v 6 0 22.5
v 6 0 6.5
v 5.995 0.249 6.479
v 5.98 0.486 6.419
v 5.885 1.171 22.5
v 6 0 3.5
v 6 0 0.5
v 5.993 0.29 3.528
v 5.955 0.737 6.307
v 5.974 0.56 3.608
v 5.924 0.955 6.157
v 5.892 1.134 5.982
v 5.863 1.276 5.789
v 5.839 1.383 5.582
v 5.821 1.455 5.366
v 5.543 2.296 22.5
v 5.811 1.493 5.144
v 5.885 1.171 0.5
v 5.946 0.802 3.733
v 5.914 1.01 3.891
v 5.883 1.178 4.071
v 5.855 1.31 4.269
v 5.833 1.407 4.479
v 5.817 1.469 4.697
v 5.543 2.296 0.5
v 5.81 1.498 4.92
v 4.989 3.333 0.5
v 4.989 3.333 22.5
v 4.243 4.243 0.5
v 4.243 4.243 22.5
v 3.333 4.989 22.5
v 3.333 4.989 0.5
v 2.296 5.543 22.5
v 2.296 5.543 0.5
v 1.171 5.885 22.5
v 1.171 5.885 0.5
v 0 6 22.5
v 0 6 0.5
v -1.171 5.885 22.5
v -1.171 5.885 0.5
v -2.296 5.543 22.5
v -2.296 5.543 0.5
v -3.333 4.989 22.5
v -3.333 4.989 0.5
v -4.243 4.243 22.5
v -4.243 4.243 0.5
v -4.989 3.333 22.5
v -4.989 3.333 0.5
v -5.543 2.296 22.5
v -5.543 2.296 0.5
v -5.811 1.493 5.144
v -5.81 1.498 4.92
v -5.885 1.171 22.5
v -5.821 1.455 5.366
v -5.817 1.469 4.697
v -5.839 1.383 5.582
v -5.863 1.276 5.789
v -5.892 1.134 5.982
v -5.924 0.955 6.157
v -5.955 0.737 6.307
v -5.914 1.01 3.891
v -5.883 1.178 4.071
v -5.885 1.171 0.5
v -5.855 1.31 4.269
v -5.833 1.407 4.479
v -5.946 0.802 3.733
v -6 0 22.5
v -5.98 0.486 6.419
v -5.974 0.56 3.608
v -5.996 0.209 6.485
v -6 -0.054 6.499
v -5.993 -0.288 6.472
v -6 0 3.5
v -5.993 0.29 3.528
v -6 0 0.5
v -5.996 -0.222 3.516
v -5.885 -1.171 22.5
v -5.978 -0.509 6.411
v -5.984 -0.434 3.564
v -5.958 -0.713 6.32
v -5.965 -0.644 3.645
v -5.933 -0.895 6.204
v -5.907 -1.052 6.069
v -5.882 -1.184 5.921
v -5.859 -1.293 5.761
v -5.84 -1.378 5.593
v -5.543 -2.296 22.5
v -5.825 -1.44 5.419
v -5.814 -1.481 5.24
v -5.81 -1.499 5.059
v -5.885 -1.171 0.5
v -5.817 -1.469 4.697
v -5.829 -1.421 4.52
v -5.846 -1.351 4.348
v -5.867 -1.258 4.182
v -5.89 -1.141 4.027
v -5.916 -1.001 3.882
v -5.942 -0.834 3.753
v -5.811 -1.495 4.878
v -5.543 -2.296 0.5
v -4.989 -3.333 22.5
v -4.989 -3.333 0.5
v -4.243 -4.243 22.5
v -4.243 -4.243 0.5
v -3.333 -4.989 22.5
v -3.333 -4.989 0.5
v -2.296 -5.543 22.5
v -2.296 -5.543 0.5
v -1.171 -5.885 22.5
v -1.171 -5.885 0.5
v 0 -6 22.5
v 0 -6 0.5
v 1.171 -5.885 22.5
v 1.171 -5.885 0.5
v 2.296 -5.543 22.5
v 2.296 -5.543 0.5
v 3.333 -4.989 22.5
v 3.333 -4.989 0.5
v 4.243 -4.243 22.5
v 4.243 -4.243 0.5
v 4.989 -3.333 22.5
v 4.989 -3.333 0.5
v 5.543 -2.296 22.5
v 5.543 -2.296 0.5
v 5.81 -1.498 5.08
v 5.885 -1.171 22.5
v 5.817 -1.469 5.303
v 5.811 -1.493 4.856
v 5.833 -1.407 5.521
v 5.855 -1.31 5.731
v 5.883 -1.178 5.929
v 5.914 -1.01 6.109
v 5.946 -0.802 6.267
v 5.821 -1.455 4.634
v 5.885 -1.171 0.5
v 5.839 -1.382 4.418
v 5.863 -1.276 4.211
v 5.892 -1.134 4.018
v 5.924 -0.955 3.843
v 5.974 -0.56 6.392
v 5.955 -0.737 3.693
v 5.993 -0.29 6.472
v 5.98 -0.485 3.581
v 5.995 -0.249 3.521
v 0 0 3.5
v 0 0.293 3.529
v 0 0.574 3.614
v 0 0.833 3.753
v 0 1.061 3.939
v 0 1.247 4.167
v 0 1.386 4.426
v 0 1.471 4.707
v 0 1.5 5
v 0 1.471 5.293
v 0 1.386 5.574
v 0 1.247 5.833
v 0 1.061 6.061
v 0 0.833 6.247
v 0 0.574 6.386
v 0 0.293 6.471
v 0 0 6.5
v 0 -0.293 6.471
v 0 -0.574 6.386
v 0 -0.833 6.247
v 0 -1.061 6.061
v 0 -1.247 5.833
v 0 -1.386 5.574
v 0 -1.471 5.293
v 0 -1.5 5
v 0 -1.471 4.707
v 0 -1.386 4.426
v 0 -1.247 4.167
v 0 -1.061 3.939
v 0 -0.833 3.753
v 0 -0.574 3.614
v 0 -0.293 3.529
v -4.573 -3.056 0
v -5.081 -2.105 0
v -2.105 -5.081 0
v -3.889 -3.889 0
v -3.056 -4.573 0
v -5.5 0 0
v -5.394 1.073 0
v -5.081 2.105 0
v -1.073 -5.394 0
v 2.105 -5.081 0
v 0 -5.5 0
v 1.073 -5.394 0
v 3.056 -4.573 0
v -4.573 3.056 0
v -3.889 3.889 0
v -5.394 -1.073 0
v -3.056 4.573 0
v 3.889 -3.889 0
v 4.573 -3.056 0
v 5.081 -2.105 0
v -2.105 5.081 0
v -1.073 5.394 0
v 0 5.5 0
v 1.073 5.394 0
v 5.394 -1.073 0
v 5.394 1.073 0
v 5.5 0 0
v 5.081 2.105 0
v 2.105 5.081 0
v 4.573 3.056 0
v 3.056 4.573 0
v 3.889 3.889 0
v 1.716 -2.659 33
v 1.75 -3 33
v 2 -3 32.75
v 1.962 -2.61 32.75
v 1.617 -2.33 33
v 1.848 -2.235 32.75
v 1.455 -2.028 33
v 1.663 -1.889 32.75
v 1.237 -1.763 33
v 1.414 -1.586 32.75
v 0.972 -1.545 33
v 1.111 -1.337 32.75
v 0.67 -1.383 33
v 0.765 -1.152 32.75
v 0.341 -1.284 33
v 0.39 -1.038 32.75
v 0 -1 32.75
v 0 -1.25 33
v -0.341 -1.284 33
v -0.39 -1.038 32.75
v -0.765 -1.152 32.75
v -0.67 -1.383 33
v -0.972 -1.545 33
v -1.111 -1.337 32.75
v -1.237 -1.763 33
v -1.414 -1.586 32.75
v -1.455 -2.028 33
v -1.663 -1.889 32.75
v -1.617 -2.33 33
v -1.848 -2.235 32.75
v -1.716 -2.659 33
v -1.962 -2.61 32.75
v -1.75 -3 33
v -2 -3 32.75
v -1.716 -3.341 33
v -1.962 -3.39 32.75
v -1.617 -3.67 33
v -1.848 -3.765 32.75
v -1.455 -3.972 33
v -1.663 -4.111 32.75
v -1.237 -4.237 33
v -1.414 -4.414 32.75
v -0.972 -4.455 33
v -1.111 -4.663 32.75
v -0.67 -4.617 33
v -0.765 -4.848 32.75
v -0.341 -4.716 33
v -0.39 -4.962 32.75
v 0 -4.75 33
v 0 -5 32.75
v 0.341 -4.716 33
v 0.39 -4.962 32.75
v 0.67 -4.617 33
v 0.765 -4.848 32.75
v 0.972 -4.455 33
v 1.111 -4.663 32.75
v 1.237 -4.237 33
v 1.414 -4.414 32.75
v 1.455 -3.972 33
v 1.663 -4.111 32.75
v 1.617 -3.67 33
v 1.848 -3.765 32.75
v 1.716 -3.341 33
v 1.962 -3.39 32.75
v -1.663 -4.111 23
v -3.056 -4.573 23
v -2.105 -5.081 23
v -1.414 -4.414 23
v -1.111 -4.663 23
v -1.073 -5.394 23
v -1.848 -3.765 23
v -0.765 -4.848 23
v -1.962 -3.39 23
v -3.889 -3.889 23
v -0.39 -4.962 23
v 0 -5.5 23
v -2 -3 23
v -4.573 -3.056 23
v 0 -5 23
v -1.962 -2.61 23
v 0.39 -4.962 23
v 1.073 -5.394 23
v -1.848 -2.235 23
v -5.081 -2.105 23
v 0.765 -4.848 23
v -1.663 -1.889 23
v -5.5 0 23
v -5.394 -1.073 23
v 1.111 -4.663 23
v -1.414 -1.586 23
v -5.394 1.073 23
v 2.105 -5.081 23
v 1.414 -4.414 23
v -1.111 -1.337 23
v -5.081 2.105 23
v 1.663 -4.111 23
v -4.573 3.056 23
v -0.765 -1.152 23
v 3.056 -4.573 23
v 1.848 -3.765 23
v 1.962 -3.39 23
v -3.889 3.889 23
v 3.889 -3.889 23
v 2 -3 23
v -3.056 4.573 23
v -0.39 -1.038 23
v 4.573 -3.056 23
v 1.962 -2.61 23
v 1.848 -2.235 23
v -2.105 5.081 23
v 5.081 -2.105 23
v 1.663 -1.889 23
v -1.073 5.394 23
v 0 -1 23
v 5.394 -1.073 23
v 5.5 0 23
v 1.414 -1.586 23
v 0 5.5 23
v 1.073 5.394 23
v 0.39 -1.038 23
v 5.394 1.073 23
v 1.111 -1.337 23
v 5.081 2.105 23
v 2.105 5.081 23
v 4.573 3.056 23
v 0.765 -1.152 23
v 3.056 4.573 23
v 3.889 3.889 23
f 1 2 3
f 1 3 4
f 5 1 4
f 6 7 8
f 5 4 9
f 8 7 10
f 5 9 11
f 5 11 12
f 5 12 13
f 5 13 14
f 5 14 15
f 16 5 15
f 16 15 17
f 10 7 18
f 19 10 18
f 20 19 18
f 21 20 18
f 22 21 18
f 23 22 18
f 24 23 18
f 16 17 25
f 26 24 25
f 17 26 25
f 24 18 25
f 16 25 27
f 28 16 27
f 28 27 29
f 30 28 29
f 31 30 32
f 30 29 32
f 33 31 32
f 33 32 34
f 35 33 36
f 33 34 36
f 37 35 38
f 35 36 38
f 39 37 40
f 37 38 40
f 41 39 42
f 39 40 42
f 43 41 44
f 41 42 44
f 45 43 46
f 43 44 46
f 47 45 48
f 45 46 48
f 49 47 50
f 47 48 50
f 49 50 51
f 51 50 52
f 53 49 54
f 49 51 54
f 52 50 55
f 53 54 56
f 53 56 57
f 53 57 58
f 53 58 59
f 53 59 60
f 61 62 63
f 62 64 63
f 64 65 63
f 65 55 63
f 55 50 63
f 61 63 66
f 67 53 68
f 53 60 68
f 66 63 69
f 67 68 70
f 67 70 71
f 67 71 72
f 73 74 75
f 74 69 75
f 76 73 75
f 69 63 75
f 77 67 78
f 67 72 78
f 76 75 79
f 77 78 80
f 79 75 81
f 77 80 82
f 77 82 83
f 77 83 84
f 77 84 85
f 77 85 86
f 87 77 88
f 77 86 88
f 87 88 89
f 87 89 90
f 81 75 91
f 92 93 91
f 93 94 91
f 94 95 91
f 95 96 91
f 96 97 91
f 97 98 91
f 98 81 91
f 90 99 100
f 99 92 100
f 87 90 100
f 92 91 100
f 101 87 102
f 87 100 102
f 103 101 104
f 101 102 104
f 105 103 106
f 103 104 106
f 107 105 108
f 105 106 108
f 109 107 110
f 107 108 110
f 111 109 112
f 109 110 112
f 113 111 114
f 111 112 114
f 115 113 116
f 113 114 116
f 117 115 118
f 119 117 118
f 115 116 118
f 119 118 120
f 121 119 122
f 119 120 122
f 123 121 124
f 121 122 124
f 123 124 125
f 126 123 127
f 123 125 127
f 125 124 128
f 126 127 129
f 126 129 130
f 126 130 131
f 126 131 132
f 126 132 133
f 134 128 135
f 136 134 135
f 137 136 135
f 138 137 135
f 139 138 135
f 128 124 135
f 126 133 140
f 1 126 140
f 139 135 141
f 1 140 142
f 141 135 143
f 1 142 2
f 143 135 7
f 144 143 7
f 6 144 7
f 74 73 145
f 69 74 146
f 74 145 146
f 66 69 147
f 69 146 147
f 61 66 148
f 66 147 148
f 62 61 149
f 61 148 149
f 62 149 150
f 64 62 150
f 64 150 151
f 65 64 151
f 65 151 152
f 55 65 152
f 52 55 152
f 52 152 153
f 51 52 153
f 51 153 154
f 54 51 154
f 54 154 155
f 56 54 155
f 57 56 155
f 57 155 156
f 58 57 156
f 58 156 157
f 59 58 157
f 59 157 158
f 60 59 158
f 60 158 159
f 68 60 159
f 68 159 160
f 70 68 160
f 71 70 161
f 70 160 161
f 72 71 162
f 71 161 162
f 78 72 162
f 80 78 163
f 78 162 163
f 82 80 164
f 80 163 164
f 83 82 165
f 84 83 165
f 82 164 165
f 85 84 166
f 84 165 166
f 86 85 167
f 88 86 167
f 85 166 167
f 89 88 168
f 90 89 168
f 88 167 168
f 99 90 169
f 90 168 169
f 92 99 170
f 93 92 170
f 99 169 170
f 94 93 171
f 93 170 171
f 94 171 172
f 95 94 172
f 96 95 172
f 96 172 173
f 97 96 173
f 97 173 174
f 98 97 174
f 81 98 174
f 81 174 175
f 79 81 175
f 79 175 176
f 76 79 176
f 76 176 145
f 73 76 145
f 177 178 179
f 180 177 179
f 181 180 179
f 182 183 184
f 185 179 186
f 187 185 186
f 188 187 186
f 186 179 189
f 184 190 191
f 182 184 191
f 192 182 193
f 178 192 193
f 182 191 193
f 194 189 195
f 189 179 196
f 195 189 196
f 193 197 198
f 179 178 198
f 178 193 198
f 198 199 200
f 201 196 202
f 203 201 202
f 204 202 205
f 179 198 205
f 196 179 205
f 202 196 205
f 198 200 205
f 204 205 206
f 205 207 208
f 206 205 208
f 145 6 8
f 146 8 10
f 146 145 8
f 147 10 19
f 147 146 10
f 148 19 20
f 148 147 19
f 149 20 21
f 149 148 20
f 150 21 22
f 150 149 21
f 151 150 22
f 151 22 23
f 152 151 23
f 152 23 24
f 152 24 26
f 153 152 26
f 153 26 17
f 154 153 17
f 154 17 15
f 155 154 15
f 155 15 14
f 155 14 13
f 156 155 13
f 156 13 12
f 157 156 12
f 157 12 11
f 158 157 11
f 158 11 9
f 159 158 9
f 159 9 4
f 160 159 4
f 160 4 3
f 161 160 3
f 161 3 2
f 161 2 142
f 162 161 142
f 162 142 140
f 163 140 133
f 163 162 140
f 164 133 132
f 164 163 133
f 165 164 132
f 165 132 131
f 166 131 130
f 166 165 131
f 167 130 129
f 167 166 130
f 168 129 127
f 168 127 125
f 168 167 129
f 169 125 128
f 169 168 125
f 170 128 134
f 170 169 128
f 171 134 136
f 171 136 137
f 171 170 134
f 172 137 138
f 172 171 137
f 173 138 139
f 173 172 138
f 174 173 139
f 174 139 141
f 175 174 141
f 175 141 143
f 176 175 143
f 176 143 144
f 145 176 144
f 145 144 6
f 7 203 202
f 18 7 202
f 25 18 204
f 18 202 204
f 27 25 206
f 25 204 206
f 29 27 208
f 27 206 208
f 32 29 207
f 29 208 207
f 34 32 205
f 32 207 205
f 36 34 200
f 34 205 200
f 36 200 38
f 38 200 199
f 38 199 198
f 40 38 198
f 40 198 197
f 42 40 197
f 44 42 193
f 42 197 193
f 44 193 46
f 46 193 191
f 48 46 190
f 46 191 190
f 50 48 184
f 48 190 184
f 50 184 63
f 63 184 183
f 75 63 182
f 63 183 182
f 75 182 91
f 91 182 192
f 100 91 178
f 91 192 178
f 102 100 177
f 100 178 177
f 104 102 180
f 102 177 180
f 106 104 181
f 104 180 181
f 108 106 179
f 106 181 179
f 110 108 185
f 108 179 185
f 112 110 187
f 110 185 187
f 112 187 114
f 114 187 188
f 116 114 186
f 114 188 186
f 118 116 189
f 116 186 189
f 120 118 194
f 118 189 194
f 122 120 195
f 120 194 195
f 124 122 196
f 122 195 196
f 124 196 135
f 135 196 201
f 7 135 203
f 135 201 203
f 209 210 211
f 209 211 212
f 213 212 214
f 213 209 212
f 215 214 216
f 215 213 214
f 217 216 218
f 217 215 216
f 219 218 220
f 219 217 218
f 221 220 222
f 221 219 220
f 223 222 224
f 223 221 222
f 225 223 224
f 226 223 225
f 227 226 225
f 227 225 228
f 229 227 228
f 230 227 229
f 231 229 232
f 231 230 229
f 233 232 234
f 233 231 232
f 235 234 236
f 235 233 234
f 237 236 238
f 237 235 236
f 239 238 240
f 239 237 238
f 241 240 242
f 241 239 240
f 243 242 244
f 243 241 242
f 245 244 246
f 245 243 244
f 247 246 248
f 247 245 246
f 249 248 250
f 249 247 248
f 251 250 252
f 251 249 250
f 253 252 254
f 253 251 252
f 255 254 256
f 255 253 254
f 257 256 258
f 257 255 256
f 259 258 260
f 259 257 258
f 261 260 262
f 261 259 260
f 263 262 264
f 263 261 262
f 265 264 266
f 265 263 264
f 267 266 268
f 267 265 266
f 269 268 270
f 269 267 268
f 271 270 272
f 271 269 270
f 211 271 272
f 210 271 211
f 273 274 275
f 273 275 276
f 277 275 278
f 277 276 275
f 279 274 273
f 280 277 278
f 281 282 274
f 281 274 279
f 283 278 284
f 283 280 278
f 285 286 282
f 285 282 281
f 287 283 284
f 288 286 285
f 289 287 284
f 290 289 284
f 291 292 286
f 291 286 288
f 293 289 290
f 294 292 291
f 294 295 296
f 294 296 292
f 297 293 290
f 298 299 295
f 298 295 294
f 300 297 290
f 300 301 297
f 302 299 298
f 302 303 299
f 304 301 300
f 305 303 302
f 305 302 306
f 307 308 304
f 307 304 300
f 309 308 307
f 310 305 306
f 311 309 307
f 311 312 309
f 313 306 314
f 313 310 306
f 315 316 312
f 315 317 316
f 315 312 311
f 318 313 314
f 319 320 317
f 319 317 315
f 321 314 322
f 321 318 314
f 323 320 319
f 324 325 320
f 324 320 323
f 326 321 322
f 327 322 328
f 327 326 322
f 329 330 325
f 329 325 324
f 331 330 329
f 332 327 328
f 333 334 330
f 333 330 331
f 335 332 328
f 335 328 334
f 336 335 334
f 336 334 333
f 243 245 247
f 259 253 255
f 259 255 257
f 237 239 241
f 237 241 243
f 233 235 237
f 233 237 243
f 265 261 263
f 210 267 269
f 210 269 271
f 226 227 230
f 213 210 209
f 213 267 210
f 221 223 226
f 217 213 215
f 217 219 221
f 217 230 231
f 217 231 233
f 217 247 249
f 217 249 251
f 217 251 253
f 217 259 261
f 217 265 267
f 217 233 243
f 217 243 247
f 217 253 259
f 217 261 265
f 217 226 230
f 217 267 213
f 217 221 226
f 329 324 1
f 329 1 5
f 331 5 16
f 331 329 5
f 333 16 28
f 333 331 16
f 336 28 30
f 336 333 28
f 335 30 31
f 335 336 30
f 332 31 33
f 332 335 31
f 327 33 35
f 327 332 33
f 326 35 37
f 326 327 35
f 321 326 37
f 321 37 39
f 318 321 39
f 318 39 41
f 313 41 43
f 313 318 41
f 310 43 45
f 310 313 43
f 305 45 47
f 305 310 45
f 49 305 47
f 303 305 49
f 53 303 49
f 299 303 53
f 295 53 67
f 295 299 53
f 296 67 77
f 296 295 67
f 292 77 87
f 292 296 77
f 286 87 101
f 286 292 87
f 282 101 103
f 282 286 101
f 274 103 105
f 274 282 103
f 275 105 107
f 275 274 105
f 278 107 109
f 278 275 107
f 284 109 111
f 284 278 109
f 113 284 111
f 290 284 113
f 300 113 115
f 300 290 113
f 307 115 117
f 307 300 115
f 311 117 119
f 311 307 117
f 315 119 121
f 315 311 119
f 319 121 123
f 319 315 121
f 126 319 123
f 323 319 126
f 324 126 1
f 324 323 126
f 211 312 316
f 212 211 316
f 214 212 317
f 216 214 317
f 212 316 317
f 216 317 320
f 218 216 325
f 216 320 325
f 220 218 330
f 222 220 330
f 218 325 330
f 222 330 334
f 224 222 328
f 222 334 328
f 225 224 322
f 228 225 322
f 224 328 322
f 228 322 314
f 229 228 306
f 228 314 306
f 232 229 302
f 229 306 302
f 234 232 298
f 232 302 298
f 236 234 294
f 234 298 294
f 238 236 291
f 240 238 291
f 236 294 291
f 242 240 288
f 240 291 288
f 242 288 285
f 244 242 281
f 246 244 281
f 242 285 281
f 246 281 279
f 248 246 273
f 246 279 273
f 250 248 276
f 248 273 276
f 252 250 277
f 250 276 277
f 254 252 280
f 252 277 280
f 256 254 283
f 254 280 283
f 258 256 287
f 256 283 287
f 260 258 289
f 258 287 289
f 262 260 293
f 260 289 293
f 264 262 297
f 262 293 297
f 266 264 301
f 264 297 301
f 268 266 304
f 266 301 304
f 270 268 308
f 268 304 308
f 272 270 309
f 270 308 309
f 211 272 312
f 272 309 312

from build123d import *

# Parameters (mm, degrees)
SKETCH1_R               = 6
BOSS_EXTRUDE1_DEPTH     = 23
SKETCH2_R               = 2
BOSS_EXTRUDE2_DEPTH     = 10
CHAMFER1_SIZE           = 0.5
CHAMFER2_SIZE           = 0.25
SKETCH3_R               = 1.5
CUT_EXTRUDE1_DEPTH      = 7
CUT_EXTRUDE1_DEPTH_BACK = 7


with BuildPart() as part:
    # Sketch1 → Boss-Extrude1 (new body)
    with BuildSketch(Plane.XY):
        Circle(SKETCH1_R)
    extrude(amount=BOSS_EXTRUDE1_DEPTH)

    # Sketch2 → Boss-Extrude2 (add)
    with BuildSketch(Plane.XY.offset(23)):
        with Locations((0, -3)):
            Circle(SKETCH2_R)
    extrude(amount=BOSS_EXTRUDE2_DEPTH)

    # Chamfer1
    chamfer1_edges = [part.edges().sort_by_distance(p)[0] for p in [
        (-6, 0, 0),
        (-6, 0, 23),
    ]]
    chamfer(chamfer1_edges, length=CHAMFER1_SIZE)

    # Chamfer2
    chamfer2_edges = [part.edges().sort_by_distance(p)[0] for p in [
        (-2, -3, 33),
    ]]
    chamfer(chamfer2_edges, length=CHAMFER2_SIZE)

    # Sketch3 → Cut-Extrude1 (cut, two sides)
    with BuildSketch(Plane(origin=(0, 0, 0), x_dir=(0, 0, -1), z_dir=(1, 0, 0))) as cut_extrude1_sk:
        with Locations((-5, 0)):
            Circle(SKETCH3_R)
    extrude(amount=CUT_EXTRUDE1_DEPTH, mode=Mode.SUBTRACT)
    extrude(cut_extrude1_sk.sketch, amount=-CUT_EXTRUDE1_DEPTH_BACK, mode=Mode.SUBTRACT)


solid = part.part
